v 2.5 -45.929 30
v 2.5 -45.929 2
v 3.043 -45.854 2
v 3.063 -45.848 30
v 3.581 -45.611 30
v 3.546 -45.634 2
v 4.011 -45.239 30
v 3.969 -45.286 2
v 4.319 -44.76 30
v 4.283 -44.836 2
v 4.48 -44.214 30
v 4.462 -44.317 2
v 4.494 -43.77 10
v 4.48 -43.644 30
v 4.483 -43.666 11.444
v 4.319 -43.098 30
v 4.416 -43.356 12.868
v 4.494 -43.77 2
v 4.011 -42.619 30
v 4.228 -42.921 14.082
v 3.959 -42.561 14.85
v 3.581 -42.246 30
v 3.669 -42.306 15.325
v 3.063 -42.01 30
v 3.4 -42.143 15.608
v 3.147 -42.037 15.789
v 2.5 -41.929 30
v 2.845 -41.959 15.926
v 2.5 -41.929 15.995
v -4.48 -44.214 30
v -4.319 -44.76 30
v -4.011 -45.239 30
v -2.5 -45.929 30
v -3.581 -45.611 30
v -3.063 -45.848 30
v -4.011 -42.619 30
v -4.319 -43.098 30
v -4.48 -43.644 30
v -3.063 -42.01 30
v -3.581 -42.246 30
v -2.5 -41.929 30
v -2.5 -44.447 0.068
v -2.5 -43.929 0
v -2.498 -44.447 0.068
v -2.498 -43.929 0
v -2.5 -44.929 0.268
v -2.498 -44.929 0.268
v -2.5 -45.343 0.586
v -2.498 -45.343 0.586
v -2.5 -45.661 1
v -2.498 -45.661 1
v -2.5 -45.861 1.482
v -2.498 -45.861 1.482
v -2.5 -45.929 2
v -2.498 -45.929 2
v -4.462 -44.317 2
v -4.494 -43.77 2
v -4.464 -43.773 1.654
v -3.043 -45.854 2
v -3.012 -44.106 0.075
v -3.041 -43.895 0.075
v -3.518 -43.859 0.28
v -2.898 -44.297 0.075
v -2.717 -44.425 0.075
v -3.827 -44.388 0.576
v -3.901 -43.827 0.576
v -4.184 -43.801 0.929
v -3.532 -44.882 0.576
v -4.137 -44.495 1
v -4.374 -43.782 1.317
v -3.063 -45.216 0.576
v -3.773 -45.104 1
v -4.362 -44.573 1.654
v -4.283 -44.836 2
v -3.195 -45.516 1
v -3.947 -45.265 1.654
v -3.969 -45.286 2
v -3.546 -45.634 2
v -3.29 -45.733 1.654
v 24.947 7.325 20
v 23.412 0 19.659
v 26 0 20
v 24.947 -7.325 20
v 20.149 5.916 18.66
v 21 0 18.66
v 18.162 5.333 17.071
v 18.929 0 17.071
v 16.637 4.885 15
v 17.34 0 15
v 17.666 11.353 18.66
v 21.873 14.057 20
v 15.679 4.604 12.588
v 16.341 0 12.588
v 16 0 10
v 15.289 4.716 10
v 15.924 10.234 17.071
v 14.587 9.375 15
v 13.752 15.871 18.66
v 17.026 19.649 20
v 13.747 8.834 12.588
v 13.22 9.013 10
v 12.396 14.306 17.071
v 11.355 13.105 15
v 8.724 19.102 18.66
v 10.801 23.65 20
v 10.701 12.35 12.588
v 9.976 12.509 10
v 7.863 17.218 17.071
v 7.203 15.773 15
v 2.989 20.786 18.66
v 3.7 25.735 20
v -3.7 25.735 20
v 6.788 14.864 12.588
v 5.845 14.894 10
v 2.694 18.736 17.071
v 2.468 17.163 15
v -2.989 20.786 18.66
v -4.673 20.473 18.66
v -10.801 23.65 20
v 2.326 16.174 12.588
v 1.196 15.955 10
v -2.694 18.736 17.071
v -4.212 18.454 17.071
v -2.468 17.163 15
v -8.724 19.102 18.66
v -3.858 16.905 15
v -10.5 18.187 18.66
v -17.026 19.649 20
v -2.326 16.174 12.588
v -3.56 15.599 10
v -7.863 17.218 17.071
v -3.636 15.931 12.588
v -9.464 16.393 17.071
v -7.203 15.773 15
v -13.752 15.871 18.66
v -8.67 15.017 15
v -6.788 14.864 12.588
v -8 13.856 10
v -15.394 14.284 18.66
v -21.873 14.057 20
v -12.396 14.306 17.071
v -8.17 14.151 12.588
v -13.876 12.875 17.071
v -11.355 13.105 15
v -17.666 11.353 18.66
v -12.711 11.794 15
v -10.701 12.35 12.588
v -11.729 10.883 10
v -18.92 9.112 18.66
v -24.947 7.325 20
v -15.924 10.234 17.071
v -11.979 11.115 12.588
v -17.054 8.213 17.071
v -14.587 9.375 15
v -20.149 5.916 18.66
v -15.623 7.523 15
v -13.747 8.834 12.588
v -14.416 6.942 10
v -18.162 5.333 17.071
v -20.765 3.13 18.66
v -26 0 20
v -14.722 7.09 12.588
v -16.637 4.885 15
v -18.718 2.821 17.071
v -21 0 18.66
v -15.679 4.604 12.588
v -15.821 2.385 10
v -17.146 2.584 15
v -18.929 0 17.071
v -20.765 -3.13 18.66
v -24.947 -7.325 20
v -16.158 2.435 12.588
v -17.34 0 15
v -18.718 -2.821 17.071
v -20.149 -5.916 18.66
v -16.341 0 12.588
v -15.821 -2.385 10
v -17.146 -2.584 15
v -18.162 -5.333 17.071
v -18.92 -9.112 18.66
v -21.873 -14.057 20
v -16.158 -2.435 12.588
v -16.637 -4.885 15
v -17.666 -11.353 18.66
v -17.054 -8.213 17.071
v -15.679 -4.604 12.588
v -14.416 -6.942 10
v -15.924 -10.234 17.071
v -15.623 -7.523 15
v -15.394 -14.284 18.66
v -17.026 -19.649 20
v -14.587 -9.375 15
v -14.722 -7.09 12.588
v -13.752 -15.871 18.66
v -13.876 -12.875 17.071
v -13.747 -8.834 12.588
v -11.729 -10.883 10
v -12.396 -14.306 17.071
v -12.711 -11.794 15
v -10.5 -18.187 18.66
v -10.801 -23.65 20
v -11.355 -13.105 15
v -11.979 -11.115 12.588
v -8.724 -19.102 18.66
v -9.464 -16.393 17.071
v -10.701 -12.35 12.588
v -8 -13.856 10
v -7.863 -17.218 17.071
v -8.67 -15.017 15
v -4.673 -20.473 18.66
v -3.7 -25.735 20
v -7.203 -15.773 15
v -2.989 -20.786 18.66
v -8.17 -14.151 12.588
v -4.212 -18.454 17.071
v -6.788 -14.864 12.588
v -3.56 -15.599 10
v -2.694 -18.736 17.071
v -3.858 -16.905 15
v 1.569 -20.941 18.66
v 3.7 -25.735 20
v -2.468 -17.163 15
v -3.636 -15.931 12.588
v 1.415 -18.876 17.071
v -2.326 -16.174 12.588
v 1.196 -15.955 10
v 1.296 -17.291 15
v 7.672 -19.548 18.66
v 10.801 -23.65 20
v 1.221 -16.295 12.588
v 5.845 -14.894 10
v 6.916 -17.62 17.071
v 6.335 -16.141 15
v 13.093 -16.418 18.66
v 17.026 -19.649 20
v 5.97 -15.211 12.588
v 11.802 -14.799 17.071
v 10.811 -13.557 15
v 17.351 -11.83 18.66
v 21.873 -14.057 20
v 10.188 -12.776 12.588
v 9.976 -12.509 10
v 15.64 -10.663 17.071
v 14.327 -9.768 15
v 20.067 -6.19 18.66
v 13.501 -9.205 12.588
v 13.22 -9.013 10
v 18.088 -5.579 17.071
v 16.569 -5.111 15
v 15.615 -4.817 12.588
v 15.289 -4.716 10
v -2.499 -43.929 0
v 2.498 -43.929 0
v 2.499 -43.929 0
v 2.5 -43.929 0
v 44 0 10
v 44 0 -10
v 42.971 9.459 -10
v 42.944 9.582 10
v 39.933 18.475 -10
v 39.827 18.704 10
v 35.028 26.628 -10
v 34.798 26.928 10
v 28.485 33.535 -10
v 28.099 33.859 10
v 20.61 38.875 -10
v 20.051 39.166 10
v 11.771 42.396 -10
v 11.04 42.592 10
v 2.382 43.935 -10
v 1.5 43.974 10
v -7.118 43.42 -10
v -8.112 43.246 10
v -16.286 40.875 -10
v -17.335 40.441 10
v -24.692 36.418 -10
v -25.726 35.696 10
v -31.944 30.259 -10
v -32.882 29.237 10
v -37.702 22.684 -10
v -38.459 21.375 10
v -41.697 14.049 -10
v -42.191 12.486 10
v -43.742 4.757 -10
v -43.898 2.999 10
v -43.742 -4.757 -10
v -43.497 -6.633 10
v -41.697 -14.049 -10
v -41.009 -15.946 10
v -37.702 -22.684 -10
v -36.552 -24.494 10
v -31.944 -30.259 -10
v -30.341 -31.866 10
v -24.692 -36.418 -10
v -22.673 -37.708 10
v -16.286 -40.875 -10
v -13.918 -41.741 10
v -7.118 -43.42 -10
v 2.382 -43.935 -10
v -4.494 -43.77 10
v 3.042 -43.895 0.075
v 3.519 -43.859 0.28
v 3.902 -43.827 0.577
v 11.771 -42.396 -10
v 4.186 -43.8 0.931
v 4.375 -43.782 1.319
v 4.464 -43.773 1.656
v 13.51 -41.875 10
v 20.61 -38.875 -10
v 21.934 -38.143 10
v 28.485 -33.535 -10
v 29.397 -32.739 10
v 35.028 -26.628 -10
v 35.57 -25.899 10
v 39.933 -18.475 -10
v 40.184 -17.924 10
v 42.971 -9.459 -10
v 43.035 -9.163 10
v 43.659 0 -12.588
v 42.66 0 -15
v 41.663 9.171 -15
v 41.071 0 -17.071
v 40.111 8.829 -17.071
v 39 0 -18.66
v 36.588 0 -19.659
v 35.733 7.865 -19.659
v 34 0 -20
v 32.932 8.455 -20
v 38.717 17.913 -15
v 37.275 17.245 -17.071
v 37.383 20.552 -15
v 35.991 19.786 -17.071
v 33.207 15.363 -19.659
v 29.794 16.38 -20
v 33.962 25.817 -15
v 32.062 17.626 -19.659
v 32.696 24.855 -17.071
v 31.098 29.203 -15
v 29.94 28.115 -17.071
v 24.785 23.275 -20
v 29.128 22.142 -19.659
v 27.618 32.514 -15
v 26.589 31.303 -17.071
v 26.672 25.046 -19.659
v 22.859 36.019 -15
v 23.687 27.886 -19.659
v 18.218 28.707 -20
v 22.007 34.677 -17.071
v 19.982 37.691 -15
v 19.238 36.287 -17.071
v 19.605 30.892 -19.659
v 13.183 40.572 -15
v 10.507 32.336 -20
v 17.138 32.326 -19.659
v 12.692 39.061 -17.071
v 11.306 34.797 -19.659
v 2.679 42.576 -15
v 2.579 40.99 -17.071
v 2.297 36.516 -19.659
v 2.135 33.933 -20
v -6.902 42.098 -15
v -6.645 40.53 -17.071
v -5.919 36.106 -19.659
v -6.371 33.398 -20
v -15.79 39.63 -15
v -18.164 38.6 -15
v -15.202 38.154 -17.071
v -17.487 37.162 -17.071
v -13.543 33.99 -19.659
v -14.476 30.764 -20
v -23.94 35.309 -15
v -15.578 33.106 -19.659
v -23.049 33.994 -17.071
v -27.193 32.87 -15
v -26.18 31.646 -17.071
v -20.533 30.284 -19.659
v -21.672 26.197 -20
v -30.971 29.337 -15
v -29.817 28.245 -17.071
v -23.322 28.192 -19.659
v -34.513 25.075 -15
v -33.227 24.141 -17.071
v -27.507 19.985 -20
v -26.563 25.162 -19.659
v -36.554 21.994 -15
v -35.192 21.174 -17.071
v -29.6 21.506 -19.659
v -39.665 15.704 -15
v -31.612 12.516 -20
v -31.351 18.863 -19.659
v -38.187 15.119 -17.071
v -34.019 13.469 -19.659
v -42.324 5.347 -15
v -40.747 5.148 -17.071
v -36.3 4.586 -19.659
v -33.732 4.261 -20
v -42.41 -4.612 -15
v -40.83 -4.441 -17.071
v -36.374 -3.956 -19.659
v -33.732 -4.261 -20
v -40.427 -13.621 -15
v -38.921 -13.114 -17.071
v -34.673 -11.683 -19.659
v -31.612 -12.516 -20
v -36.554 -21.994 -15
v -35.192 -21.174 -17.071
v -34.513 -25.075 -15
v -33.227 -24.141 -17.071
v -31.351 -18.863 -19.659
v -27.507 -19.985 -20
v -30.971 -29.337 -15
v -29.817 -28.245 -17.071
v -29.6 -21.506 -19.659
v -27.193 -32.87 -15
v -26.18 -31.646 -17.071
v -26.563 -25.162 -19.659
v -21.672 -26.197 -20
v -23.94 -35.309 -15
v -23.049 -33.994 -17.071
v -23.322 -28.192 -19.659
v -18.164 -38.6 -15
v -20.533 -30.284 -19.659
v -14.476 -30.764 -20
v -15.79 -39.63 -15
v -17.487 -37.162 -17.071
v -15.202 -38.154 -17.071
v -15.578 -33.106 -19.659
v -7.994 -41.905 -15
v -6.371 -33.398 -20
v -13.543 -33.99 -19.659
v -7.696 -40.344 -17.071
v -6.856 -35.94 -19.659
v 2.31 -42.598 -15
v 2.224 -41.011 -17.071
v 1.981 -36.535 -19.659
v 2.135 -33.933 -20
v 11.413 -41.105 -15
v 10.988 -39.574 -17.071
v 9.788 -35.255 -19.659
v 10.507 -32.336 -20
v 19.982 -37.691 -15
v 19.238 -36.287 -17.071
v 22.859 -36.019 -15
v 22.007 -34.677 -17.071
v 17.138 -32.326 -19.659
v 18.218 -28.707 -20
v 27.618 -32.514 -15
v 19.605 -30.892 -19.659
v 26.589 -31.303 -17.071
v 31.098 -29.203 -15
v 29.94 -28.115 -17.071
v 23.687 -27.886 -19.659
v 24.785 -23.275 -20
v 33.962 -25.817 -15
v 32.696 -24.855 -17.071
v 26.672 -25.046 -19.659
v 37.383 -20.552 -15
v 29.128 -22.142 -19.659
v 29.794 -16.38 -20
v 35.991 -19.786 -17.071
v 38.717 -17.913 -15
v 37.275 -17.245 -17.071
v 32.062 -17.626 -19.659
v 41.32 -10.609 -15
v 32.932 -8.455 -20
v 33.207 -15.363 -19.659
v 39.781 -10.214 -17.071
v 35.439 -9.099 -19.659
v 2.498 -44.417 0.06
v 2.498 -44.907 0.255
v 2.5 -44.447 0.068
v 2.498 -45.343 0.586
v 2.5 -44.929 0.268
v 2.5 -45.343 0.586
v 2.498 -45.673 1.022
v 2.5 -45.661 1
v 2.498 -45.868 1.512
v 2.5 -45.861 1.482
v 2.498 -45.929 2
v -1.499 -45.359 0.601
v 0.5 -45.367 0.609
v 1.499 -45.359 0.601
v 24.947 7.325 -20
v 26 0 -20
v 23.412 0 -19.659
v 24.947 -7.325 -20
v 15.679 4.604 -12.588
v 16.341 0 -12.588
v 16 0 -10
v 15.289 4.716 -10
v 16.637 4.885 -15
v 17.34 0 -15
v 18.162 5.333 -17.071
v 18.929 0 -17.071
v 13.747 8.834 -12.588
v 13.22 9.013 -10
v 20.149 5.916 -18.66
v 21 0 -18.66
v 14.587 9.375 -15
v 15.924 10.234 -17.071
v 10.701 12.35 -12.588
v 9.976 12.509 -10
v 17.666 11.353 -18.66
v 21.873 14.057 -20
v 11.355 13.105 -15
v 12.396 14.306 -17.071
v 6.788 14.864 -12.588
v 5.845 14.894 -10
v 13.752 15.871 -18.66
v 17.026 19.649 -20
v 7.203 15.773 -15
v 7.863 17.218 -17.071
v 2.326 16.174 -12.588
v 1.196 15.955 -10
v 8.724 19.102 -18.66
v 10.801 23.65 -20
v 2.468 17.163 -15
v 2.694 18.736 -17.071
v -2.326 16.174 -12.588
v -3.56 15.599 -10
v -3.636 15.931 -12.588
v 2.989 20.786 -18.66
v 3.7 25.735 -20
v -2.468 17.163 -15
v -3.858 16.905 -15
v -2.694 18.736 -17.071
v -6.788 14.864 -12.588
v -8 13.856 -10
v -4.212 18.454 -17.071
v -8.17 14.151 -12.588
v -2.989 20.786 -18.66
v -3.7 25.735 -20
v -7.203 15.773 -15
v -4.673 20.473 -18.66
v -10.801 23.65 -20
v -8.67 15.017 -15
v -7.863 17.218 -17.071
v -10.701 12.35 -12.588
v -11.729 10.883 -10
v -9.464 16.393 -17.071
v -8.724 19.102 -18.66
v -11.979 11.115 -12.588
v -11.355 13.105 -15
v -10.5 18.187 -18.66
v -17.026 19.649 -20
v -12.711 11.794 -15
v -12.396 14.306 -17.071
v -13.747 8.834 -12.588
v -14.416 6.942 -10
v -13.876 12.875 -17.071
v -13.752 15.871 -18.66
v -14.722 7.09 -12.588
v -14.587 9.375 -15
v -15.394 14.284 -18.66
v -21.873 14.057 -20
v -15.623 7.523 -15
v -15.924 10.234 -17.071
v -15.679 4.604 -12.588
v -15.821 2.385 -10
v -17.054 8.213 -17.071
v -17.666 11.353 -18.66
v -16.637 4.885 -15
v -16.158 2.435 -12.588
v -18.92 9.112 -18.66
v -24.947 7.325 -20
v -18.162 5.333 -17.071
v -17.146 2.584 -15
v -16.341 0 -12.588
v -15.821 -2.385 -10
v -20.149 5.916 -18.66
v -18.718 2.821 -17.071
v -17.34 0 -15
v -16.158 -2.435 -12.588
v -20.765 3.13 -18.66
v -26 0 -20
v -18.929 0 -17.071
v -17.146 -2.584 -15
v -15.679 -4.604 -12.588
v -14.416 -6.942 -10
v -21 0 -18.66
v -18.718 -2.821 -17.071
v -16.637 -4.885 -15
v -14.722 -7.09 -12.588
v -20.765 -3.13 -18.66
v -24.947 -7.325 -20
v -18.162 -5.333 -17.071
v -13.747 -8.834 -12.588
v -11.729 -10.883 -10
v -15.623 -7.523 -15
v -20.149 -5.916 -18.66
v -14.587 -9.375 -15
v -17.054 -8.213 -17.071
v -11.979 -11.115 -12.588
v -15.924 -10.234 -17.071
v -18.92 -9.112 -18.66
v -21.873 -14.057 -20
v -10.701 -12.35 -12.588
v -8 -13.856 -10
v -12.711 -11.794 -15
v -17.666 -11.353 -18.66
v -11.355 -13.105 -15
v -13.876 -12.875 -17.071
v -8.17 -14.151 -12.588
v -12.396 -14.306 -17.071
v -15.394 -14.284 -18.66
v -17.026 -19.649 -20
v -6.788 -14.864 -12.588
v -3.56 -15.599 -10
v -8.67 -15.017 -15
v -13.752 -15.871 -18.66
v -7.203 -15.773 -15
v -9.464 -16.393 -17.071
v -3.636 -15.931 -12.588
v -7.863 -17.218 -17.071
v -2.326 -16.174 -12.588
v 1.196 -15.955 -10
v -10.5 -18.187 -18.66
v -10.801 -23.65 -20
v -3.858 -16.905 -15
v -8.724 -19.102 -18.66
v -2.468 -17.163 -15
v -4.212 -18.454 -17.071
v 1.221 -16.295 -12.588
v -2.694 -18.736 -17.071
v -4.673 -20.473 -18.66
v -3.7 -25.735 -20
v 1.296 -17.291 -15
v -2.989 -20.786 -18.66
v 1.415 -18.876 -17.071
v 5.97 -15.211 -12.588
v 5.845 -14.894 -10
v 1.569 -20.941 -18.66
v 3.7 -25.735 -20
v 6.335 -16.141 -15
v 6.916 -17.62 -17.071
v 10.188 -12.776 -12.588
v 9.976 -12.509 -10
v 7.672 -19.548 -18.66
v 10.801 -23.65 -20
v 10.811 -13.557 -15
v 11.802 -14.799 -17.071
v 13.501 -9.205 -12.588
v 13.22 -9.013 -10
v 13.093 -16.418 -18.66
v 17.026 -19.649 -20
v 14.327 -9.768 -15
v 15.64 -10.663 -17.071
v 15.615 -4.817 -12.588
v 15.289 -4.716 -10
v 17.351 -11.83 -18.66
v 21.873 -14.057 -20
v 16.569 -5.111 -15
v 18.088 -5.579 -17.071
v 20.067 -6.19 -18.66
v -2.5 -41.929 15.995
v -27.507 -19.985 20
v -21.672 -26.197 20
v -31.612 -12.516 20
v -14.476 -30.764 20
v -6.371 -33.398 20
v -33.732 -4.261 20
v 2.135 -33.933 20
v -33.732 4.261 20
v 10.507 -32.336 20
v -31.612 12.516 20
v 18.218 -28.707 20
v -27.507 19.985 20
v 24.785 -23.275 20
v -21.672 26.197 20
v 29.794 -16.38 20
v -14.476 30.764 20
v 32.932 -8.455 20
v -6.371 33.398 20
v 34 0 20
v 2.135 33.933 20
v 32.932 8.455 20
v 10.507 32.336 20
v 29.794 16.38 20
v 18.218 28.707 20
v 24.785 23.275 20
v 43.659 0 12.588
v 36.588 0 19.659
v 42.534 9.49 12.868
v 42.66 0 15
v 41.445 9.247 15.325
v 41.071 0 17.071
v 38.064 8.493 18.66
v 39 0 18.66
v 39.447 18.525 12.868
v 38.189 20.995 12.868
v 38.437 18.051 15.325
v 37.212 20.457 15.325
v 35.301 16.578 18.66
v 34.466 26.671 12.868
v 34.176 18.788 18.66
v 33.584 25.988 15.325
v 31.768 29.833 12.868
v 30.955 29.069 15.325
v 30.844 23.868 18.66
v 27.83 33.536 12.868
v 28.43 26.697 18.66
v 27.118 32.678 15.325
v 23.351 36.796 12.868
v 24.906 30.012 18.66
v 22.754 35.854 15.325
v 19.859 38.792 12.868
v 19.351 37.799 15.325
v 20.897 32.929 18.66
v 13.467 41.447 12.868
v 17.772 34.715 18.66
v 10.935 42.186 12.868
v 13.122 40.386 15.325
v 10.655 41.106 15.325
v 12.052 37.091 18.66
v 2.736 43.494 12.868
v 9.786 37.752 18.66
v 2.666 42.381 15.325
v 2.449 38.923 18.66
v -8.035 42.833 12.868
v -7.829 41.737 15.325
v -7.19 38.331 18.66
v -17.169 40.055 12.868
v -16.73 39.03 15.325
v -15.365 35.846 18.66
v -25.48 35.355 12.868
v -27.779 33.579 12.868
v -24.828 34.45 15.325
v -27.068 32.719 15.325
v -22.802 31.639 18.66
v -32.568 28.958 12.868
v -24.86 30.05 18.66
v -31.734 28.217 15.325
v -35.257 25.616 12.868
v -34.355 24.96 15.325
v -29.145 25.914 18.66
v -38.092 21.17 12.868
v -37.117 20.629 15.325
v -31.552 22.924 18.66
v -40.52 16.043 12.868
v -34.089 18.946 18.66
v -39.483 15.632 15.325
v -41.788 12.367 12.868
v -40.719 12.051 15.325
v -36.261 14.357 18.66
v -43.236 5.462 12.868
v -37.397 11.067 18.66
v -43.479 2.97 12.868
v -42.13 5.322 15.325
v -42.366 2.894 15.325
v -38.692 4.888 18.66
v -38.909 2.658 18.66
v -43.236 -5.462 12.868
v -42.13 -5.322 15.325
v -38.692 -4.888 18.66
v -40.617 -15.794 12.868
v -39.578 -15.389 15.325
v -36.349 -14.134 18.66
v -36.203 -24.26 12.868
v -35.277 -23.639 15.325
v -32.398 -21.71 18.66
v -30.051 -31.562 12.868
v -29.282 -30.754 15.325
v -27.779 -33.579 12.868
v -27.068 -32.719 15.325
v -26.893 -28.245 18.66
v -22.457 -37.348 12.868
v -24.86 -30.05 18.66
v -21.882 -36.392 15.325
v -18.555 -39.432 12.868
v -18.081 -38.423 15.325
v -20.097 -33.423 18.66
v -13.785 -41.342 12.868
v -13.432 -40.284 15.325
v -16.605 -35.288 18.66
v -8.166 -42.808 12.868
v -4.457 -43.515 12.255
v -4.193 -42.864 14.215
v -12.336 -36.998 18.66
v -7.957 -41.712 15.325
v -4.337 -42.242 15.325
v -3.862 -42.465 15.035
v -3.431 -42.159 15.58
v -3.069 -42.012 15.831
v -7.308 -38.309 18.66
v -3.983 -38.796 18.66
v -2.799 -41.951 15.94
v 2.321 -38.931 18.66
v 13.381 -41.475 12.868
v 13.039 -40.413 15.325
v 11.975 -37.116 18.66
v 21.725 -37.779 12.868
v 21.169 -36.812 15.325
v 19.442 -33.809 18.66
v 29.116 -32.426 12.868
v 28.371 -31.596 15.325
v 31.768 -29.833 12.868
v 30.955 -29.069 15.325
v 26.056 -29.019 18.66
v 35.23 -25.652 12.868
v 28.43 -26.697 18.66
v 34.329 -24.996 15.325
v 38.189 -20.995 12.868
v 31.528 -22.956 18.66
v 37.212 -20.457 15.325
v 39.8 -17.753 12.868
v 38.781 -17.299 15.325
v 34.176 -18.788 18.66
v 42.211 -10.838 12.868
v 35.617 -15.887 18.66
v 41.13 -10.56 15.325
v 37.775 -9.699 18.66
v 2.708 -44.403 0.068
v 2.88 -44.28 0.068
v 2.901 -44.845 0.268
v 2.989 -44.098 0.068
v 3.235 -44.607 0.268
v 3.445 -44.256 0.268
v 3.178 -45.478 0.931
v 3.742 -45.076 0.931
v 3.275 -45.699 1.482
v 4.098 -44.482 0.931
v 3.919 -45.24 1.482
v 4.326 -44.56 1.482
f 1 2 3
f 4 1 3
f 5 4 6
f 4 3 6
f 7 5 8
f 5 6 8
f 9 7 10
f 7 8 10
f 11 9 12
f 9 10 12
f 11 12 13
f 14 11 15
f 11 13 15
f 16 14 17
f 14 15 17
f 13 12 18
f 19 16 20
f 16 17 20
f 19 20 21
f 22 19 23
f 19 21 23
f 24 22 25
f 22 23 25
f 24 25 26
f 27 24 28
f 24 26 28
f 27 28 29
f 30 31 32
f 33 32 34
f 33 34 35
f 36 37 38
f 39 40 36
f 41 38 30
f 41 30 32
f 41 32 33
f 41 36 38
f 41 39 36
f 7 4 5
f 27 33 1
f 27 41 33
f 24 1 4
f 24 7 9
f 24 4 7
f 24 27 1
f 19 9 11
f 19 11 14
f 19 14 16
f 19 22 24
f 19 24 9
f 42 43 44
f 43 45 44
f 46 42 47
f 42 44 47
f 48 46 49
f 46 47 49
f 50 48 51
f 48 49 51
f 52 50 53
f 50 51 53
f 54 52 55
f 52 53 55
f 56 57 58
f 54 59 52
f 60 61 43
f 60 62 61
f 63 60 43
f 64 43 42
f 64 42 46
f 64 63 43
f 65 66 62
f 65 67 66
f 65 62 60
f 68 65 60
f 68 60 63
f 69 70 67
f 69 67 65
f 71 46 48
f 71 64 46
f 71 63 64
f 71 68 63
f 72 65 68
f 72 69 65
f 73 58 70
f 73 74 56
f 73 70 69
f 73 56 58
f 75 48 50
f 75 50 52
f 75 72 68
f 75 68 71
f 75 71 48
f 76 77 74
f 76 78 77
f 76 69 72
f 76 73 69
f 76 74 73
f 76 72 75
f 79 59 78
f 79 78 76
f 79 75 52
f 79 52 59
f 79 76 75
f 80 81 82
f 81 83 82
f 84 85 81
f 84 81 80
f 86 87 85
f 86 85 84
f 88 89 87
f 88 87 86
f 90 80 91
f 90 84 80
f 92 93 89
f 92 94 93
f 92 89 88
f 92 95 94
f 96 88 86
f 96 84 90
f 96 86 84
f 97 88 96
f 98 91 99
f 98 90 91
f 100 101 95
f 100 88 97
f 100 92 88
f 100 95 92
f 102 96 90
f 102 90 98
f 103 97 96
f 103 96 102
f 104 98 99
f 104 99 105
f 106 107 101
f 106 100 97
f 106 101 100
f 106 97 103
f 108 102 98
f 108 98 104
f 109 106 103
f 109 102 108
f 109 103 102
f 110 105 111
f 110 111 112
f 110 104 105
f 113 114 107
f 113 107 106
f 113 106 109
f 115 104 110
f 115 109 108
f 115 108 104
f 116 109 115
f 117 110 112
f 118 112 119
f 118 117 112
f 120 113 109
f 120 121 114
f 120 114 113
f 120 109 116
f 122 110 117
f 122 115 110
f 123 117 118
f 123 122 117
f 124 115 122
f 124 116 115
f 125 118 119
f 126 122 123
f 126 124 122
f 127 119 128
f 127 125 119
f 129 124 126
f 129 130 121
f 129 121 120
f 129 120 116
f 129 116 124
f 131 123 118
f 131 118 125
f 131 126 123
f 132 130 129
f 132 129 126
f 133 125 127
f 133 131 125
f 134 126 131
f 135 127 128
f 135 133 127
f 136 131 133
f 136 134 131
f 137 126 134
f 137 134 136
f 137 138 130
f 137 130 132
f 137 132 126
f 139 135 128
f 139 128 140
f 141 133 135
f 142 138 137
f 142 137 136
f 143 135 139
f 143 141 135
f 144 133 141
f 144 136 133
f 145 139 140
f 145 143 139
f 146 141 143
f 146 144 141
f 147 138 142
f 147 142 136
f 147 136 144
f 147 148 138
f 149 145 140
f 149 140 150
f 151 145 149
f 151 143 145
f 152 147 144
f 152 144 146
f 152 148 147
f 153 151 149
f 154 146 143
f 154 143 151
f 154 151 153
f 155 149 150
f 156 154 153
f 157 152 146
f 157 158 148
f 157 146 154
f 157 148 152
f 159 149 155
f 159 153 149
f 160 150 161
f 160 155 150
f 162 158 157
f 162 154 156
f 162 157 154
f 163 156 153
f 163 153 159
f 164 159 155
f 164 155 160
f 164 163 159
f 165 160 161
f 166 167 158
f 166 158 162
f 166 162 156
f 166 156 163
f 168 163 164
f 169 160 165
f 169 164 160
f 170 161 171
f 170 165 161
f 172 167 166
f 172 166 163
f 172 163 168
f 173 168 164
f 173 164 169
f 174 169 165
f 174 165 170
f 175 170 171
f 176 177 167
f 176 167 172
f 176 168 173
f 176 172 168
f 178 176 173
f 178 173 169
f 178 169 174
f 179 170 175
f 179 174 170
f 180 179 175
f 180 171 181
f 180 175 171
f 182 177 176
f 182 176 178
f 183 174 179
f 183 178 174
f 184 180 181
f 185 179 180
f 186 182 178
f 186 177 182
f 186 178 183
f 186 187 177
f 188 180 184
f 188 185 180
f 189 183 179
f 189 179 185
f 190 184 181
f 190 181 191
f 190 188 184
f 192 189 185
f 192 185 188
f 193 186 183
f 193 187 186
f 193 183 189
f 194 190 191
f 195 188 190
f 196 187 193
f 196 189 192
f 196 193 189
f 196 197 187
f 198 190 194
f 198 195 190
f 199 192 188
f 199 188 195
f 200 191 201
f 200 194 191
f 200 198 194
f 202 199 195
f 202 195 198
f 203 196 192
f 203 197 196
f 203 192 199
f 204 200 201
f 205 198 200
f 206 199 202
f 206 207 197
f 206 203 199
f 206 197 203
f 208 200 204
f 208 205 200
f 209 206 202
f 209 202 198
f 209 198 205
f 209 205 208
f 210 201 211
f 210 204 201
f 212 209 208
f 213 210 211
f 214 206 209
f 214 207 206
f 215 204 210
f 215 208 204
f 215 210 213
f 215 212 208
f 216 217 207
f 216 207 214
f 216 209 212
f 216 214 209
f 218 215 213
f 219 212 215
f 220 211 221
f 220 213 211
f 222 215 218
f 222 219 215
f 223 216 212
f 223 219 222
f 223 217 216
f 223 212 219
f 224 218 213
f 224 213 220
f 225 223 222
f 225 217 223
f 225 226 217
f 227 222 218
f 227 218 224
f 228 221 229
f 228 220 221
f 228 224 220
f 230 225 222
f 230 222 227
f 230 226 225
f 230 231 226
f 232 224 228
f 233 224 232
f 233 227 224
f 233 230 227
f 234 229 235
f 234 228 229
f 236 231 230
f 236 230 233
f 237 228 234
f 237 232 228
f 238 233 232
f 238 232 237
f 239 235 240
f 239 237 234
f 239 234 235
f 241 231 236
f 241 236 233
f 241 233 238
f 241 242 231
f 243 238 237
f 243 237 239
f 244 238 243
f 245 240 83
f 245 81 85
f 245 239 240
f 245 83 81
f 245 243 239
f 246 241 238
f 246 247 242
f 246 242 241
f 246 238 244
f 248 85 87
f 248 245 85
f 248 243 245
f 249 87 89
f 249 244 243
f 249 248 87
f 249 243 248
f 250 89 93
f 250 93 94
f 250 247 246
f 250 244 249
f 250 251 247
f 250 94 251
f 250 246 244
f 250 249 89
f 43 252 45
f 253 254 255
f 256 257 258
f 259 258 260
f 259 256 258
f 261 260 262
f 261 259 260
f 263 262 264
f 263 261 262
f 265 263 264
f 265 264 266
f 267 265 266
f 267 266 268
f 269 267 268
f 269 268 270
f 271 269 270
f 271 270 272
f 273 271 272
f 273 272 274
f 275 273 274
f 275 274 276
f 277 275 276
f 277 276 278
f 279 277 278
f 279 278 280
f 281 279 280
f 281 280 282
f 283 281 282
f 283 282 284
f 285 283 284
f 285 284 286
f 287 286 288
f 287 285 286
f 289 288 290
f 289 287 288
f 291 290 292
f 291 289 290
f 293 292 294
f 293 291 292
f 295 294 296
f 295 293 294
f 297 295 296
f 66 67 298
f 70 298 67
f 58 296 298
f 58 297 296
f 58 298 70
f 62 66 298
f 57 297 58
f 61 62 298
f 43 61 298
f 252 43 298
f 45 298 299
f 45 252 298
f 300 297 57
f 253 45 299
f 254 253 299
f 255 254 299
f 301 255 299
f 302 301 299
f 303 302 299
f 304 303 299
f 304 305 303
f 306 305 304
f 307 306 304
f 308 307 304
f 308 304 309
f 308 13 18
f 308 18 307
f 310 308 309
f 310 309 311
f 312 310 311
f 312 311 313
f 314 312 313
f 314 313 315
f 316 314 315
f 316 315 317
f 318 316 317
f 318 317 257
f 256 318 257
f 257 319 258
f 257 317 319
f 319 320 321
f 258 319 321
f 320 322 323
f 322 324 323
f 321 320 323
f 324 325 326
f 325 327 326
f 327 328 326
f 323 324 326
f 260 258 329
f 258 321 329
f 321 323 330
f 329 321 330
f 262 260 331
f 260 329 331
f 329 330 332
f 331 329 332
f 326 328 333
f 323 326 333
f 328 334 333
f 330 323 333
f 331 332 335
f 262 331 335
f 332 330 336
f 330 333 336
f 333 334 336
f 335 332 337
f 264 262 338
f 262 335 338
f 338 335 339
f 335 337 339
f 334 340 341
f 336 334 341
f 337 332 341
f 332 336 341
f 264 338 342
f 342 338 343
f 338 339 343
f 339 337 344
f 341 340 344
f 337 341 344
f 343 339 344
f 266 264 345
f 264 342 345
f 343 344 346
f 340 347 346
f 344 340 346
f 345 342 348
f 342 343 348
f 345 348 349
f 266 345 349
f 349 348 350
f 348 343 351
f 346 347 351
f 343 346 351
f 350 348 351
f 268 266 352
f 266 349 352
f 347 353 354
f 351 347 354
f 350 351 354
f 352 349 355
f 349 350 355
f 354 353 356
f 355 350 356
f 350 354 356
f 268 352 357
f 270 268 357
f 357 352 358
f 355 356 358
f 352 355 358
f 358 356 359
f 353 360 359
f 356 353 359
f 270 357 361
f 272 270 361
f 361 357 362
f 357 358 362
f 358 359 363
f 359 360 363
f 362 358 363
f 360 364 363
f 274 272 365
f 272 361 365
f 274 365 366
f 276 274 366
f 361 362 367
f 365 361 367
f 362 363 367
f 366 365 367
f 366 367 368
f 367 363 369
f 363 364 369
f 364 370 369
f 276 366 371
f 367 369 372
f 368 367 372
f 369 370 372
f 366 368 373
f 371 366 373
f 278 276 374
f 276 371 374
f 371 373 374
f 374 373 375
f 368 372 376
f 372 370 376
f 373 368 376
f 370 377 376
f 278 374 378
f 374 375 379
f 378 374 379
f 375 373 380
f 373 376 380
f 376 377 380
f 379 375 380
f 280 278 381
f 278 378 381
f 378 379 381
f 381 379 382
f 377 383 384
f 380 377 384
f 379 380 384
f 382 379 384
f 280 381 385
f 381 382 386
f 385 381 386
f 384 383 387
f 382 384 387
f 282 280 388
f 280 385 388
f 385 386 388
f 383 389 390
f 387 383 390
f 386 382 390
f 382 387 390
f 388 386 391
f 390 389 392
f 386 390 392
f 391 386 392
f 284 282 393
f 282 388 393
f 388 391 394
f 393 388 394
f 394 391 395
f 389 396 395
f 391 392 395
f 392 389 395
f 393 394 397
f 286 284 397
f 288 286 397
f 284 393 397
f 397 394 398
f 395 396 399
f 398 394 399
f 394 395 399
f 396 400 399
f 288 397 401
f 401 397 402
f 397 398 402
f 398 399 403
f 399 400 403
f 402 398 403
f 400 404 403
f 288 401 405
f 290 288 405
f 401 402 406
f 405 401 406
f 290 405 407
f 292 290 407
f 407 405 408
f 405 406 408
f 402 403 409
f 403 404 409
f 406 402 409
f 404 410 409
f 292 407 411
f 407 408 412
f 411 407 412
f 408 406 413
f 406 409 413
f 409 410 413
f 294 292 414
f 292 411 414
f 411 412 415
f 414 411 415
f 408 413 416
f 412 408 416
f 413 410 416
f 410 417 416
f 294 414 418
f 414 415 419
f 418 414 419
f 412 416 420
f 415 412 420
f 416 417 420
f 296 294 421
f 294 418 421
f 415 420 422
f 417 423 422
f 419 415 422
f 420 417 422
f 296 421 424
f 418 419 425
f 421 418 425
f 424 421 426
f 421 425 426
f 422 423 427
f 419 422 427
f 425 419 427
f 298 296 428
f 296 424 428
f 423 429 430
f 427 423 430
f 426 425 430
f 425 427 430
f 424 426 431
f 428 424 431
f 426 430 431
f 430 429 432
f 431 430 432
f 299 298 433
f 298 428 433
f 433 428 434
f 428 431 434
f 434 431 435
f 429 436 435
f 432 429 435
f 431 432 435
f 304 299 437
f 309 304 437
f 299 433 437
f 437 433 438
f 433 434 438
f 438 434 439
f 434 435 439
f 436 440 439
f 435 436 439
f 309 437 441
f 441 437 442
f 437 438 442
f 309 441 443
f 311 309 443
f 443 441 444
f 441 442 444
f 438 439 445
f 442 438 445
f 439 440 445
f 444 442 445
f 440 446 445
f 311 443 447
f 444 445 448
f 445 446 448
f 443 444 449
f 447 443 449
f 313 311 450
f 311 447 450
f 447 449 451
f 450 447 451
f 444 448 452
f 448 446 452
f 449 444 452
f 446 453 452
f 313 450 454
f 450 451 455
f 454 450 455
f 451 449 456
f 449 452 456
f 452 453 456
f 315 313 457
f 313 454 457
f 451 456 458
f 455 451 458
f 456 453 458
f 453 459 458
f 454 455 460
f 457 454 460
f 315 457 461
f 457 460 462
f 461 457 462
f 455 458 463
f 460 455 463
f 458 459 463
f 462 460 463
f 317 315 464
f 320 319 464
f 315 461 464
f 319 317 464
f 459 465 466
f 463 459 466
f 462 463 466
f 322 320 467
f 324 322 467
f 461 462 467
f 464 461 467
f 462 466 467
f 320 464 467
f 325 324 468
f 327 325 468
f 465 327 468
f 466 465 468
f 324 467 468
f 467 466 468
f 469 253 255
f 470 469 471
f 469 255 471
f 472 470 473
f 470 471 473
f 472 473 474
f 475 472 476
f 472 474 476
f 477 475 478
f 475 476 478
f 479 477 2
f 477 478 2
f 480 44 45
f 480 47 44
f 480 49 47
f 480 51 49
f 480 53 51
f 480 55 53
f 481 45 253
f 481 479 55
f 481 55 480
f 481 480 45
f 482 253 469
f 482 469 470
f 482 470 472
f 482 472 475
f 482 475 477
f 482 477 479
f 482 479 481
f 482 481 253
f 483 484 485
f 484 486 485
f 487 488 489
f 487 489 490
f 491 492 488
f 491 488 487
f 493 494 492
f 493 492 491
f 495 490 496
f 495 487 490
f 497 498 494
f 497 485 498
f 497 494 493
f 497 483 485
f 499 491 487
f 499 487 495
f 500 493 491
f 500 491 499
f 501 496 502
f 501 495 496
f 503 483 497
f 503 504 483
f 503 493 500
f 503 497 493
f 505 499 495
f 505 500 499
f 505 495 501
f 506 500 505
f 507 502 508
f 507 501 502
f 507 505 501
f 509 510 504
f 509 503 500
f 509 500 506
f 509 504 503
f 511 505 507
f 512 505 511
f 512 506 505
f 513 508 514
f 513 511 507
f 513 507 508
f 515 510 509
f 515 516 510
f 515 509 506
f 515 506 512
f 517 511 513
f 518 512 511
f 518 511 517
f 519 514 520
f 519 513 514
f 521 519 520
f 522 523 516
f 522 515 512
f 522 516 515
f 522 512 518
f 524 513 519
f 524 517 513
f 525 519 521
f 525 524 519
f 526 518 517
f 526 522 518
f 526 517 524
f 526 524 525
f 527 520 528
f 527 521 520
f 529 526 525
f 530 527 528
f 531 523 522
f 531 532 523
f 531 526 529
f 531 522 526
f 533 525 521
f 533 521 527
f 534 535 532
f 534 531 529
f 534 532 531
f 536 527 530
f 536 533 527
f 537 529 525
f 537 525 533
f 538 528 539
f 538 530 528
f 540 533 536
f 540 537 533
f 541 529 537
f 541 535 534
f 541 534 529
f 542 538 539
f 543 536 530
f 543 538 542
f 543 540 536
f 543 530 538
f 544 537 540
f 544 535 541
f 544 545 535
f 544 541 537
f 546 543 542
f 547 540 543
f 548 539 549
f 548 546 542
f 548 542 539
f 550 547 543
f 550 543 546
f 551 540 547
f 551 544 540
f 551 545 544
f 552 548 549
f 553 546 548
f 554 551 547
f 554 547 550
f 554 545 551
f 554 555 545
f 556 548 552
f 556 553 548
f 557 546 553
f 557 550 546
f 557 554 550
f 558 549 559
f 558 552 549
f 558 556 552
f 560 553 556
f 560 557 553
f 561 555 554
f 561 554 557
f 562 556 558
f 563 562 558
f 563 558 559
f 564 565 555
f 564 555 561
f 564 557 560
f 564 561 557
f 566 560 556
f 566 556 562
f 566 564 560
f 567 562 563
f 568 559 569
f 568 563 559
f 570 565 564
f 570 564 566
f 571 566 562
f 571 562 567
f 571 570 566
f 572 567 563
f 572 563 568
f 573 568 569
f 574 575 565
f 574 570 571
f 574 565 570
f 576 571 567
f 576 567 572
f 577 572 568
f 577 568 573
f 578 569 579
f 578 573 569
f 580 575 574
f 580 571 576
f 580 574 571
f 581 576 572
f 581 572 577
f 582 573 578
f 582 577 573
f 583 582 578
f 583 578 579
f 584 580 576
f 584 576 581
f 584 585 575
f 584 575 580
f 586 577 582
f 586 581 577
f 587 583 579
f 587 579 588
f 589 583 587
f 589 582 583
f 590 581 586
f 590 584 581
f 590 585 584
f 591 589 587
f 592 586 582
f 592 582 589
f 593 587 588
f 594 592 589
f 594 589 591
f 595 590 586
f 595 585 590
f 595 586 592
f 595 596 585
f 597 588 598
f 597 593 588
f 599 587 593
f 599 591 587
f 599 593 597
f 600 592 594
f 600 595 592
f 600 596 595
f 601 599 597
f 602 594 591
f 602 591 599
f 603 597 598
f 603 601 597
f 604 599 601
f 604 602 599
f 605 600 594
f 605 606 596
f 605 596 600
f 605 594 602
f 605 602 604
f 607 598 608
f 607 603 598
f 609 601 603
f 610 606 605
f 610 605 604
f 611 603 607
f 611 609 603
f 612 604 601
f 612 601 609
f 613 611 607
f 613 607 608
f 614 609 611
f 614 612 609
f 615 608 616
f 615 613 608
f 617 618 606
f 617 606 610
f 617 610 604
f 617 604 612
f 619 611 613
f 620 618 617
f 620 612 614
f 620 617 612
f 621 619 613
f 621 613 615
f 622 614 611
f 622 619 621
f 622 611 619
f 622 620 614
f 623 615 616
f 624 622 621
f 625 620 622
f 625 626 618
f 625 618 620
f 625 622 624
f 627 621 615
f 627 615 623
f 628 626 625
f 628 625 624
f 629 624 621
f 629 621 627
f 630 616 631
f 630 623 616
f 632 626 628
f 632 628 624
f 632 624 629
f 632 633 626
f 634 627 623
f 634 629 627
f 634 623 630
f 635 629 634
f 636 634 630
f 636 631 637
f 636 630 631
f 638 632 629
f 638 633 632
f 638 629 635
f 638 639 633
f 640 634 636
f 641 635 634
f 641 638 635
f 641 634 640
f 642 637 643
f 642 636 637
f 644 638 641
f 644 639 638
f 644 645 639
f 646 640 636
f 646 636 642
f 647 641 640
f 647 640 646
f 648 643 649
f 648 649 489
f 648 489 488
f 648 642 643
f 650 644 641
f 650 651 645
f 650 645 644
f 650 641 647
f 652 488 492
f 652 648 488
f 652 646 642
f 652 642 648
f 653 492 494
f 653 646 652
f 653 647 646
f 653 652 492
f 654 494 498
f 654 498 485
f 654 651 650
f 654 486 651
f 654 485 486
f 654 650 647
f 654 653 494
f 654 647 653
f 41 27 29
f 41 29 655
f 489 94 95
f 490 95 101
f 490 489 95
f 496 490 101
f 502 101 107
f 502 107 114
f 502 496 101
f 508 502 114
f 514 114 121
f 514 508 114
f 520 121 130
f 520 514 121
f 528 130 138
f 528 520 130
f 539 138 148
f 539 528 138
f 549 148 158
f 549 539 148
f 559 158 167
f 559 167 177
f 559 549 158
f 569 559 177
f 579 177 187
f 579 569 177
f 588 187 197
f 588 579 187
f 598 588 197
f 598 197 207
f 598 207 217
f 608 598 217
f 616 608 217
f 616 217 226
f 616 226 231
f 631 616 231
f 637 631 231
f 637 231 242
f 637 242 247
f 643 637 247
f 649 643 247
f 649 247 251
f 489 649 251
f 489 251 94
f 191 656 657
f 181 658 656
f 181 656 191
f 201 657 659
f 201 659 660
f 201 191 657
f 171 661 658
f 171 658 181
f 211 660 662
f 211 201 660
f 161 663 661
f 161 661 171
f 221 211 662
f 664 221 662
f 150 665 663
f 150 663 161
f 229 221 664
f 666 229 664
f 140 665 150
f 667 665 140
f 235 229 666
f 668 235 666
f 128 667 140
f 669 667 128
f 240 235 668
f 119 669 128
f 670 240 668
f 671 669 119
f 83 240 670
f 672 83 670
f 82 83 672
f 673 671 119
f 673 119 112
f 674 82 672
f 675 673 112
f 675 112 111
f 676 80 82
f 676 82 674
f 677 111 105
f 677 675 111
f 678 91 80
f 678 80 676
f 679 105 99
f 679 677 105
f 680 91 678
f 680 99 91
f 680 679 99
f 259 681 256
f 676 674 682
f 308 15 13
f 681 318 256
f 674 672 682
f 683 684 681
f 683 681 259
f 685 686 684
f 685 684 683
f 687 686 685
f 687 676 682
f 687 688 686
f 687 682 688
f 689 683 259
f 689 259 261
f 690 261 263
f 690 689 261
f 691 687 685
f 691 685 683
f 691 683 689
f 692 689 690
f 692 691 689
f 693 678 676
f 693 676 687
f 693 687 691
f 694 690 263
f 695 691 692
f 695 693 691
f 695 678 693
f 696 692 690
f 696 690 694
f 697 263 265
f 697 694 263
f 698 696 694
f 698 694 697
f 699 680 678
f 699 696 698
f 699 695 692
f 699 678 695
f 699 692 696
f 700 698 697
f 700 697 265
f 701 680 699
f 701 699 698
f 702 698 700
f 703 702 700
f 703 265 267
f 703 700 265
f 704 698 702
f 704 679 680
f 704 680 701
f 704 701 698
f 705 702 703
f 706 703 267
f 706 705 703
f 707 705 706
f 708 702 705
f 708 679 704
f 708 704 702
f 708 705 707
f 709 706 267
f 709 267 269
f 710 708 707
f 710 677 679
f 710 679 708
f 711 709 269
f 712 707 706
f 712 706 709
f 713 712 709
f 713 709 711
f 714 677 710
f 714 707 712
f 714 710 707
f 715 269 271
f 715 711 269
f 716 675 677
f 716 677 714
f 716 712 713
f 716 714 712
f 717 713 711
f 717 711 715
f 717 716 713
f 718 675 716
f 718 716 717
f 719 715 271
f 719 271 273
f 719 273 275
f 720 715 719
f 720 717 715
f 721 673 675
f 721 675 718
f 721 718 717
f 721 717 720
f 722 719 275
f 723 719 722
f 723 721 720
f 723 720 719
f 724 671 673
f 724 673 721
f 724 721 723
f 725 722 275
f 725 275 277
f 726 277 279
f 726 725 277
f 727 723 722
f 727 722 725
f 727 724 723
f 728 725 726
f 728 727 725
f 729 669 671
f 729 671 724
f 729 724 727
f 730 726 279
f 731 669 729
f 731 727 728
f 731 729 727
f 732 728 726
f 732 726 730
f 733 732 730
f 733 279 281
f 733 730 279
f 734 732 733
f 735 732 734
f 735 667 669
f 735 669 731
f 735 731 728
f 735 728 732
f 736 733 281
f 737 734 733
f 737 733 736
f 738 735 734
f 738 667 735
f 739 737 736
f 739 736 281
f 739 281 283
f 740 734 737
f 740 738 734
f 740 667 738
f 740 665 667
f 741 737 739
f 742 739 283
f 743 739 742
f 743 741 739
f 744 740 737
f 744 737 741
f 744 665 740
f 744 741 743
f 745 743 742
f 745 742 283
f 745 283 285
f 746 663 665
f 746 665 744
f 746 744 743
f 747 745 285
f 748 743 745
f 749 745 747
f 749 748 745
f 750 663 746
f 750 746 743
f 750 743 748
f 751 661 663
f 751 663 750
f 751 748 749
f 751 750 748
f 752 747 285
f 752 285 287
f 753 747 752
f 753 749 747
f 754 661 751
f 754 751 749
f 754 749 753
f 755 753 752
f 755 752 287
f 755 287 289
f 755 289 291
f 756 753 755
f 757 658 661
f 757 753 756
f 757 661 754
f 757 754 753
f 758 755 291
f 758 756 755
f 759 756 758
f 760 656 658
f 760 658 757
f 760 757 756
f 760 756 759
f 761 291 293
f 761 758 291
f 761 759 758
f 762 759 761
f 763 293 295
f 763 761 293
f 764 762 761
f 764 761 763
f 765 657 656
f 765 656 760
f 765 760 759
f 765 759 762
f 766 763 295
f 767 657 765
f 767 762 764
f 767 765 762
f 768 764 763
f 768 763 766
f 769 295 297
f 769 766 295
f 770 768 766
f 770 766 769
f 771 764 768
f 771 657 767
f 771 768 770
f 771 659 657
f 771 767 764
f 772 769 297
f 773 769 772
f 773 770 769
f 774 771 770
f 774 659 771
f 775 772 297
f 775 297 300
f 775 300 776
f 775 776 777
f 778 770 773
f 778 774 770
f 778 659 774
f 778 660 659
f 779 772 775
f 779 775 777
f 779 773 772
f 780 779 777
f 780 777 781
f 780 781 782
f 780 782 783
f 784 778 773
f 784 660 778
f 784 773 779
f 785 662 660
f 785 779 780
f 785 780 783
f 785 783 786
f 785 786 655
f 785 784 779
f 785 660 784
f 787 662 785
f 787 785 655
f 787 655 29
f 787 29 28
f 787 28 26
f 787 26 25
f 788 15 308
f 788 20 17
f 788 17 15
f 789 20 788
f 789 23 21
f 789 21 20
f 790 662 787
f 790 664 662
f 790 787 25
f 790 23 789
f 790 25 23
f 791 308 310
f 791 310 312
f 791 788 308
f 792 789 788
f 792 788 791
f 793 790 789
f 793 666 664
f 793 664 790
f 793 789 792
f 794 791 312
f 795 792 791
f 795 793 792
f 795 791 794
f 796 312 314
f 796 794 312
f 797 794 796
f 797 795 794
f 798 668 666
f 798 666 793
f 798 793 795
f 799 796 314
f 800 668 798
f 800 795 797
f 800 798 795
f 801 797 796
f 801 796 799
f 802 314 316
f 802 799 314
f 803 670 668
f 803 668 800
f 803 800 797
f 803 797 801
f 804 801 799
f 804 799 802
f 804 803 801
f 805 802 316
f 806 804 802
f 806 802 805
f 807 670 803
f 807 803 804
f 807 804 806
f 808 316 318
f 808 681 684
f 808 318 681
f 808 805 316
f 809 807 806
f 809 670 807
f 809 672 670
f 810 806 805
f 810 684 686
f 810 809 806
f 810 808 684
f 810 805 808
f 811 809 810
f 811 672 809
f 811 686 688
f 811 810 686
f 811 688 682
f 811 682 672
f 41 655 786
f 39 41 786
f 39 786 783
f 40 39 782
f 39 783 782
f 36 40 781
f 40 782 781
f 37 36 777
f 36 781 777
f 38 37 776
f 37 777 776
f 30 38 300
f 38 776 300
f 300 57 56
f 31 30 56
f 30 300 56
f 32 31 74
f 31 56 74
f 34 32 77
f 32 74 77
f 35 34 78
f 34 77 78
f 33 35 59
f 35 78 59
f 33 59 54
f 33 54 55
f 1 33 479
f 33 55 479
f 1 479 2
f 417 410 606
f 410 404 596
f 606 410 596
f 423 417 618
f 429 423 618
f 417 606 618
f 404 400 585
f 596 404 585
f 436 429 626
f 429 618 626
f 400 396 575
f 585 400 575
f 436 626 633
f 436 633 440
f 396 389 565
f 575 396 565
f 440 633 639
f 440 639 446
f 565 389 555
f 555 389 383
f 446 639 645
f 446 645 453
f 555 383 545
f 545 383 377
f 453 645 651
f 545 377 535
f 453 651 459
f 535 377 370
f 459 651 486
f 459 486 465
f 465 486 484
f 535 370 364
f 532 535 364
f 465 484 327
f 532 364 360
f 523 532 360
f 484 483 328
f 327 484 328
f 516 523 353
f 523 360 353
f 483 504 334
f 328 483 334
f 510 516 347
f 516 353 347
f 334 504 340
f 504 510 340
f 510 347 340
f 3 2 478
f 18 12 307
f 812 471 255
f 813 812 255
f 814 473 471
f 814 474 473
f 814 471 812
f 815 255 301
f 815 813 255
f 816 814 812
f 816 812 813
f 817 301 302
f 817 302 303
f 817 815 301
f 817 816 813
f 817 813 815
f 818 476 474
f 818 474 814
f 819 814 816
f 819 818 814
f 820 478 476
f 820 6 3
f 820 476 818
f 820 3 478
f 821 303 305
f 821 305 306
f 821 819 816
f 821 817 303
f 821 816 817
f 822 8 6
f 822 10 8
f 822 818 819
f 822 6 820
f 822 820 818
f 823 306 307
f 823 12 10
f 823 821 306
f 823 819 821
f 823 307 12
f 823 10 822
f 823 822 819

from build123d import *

# Parameters (mm, degrees)
F0_R     = 44
F0_R_2   = 16
F1_DEPTH = 20
F2_R     = 10
F4_DEPTH = 30
F5_R     = 1.9999


# Not quite as in the source:
# - a fillet or chamfer is up to 0.001 mm smaller than in the source, because OpenCascade refuses the exact size


with BuildPart() as f1:
    # F0 (on Top) → F1 (new body, symmetric)
    with BuildSketch(Plane.XY):
        Circle(F0_R)
        Circle(F0_R_2, mode=Mode.SUBTRACT)
    extrude(amount=F1_DEPTH, both=True)

    # F2
    f2_edges = [f1.edges().sort_by_distance(p)[0] for p in [
        (-16, 0, 20),
        (16, 0, 0),
        (-16, 0, -20),
        (-44, 0, -20),
        (44, 0, 0),
        (-44, 0, 20),
    ]]
    fillet(f2_edges, radius=F2_R)

    # F3 (on Top) → F4 (join)
    with BuildSketch(Plane.XY):
        with BuildLine():
            Line((2.5, -41.9289198592), (-2.5, -41.9289198592))
            ThreePointArc((-2.5, -41.9289198592), (-4.5, -43.9289198592), (-2.5, -45.9289198592))
            Line((-2.5, -45.9289198592), (2.5, -45.9289198592))
            ThreePointArc((2.5, -45.9289198592), (4.5, -43.9289198592), (2.5, -41.9289198592))
        make_face()
    extrude(amount=F4_DEPTH)

    # F5 (radius 2 in the source; OpenCascade refuses exactly that, so slightly less here)
    f5_edges = [f1.edges().sort_by_distance(p)[0] for p in [
        (0, -45.92892, 0),
    ]]
    fillet(f5_edges, radius=F5_R)


solid = f1.part
